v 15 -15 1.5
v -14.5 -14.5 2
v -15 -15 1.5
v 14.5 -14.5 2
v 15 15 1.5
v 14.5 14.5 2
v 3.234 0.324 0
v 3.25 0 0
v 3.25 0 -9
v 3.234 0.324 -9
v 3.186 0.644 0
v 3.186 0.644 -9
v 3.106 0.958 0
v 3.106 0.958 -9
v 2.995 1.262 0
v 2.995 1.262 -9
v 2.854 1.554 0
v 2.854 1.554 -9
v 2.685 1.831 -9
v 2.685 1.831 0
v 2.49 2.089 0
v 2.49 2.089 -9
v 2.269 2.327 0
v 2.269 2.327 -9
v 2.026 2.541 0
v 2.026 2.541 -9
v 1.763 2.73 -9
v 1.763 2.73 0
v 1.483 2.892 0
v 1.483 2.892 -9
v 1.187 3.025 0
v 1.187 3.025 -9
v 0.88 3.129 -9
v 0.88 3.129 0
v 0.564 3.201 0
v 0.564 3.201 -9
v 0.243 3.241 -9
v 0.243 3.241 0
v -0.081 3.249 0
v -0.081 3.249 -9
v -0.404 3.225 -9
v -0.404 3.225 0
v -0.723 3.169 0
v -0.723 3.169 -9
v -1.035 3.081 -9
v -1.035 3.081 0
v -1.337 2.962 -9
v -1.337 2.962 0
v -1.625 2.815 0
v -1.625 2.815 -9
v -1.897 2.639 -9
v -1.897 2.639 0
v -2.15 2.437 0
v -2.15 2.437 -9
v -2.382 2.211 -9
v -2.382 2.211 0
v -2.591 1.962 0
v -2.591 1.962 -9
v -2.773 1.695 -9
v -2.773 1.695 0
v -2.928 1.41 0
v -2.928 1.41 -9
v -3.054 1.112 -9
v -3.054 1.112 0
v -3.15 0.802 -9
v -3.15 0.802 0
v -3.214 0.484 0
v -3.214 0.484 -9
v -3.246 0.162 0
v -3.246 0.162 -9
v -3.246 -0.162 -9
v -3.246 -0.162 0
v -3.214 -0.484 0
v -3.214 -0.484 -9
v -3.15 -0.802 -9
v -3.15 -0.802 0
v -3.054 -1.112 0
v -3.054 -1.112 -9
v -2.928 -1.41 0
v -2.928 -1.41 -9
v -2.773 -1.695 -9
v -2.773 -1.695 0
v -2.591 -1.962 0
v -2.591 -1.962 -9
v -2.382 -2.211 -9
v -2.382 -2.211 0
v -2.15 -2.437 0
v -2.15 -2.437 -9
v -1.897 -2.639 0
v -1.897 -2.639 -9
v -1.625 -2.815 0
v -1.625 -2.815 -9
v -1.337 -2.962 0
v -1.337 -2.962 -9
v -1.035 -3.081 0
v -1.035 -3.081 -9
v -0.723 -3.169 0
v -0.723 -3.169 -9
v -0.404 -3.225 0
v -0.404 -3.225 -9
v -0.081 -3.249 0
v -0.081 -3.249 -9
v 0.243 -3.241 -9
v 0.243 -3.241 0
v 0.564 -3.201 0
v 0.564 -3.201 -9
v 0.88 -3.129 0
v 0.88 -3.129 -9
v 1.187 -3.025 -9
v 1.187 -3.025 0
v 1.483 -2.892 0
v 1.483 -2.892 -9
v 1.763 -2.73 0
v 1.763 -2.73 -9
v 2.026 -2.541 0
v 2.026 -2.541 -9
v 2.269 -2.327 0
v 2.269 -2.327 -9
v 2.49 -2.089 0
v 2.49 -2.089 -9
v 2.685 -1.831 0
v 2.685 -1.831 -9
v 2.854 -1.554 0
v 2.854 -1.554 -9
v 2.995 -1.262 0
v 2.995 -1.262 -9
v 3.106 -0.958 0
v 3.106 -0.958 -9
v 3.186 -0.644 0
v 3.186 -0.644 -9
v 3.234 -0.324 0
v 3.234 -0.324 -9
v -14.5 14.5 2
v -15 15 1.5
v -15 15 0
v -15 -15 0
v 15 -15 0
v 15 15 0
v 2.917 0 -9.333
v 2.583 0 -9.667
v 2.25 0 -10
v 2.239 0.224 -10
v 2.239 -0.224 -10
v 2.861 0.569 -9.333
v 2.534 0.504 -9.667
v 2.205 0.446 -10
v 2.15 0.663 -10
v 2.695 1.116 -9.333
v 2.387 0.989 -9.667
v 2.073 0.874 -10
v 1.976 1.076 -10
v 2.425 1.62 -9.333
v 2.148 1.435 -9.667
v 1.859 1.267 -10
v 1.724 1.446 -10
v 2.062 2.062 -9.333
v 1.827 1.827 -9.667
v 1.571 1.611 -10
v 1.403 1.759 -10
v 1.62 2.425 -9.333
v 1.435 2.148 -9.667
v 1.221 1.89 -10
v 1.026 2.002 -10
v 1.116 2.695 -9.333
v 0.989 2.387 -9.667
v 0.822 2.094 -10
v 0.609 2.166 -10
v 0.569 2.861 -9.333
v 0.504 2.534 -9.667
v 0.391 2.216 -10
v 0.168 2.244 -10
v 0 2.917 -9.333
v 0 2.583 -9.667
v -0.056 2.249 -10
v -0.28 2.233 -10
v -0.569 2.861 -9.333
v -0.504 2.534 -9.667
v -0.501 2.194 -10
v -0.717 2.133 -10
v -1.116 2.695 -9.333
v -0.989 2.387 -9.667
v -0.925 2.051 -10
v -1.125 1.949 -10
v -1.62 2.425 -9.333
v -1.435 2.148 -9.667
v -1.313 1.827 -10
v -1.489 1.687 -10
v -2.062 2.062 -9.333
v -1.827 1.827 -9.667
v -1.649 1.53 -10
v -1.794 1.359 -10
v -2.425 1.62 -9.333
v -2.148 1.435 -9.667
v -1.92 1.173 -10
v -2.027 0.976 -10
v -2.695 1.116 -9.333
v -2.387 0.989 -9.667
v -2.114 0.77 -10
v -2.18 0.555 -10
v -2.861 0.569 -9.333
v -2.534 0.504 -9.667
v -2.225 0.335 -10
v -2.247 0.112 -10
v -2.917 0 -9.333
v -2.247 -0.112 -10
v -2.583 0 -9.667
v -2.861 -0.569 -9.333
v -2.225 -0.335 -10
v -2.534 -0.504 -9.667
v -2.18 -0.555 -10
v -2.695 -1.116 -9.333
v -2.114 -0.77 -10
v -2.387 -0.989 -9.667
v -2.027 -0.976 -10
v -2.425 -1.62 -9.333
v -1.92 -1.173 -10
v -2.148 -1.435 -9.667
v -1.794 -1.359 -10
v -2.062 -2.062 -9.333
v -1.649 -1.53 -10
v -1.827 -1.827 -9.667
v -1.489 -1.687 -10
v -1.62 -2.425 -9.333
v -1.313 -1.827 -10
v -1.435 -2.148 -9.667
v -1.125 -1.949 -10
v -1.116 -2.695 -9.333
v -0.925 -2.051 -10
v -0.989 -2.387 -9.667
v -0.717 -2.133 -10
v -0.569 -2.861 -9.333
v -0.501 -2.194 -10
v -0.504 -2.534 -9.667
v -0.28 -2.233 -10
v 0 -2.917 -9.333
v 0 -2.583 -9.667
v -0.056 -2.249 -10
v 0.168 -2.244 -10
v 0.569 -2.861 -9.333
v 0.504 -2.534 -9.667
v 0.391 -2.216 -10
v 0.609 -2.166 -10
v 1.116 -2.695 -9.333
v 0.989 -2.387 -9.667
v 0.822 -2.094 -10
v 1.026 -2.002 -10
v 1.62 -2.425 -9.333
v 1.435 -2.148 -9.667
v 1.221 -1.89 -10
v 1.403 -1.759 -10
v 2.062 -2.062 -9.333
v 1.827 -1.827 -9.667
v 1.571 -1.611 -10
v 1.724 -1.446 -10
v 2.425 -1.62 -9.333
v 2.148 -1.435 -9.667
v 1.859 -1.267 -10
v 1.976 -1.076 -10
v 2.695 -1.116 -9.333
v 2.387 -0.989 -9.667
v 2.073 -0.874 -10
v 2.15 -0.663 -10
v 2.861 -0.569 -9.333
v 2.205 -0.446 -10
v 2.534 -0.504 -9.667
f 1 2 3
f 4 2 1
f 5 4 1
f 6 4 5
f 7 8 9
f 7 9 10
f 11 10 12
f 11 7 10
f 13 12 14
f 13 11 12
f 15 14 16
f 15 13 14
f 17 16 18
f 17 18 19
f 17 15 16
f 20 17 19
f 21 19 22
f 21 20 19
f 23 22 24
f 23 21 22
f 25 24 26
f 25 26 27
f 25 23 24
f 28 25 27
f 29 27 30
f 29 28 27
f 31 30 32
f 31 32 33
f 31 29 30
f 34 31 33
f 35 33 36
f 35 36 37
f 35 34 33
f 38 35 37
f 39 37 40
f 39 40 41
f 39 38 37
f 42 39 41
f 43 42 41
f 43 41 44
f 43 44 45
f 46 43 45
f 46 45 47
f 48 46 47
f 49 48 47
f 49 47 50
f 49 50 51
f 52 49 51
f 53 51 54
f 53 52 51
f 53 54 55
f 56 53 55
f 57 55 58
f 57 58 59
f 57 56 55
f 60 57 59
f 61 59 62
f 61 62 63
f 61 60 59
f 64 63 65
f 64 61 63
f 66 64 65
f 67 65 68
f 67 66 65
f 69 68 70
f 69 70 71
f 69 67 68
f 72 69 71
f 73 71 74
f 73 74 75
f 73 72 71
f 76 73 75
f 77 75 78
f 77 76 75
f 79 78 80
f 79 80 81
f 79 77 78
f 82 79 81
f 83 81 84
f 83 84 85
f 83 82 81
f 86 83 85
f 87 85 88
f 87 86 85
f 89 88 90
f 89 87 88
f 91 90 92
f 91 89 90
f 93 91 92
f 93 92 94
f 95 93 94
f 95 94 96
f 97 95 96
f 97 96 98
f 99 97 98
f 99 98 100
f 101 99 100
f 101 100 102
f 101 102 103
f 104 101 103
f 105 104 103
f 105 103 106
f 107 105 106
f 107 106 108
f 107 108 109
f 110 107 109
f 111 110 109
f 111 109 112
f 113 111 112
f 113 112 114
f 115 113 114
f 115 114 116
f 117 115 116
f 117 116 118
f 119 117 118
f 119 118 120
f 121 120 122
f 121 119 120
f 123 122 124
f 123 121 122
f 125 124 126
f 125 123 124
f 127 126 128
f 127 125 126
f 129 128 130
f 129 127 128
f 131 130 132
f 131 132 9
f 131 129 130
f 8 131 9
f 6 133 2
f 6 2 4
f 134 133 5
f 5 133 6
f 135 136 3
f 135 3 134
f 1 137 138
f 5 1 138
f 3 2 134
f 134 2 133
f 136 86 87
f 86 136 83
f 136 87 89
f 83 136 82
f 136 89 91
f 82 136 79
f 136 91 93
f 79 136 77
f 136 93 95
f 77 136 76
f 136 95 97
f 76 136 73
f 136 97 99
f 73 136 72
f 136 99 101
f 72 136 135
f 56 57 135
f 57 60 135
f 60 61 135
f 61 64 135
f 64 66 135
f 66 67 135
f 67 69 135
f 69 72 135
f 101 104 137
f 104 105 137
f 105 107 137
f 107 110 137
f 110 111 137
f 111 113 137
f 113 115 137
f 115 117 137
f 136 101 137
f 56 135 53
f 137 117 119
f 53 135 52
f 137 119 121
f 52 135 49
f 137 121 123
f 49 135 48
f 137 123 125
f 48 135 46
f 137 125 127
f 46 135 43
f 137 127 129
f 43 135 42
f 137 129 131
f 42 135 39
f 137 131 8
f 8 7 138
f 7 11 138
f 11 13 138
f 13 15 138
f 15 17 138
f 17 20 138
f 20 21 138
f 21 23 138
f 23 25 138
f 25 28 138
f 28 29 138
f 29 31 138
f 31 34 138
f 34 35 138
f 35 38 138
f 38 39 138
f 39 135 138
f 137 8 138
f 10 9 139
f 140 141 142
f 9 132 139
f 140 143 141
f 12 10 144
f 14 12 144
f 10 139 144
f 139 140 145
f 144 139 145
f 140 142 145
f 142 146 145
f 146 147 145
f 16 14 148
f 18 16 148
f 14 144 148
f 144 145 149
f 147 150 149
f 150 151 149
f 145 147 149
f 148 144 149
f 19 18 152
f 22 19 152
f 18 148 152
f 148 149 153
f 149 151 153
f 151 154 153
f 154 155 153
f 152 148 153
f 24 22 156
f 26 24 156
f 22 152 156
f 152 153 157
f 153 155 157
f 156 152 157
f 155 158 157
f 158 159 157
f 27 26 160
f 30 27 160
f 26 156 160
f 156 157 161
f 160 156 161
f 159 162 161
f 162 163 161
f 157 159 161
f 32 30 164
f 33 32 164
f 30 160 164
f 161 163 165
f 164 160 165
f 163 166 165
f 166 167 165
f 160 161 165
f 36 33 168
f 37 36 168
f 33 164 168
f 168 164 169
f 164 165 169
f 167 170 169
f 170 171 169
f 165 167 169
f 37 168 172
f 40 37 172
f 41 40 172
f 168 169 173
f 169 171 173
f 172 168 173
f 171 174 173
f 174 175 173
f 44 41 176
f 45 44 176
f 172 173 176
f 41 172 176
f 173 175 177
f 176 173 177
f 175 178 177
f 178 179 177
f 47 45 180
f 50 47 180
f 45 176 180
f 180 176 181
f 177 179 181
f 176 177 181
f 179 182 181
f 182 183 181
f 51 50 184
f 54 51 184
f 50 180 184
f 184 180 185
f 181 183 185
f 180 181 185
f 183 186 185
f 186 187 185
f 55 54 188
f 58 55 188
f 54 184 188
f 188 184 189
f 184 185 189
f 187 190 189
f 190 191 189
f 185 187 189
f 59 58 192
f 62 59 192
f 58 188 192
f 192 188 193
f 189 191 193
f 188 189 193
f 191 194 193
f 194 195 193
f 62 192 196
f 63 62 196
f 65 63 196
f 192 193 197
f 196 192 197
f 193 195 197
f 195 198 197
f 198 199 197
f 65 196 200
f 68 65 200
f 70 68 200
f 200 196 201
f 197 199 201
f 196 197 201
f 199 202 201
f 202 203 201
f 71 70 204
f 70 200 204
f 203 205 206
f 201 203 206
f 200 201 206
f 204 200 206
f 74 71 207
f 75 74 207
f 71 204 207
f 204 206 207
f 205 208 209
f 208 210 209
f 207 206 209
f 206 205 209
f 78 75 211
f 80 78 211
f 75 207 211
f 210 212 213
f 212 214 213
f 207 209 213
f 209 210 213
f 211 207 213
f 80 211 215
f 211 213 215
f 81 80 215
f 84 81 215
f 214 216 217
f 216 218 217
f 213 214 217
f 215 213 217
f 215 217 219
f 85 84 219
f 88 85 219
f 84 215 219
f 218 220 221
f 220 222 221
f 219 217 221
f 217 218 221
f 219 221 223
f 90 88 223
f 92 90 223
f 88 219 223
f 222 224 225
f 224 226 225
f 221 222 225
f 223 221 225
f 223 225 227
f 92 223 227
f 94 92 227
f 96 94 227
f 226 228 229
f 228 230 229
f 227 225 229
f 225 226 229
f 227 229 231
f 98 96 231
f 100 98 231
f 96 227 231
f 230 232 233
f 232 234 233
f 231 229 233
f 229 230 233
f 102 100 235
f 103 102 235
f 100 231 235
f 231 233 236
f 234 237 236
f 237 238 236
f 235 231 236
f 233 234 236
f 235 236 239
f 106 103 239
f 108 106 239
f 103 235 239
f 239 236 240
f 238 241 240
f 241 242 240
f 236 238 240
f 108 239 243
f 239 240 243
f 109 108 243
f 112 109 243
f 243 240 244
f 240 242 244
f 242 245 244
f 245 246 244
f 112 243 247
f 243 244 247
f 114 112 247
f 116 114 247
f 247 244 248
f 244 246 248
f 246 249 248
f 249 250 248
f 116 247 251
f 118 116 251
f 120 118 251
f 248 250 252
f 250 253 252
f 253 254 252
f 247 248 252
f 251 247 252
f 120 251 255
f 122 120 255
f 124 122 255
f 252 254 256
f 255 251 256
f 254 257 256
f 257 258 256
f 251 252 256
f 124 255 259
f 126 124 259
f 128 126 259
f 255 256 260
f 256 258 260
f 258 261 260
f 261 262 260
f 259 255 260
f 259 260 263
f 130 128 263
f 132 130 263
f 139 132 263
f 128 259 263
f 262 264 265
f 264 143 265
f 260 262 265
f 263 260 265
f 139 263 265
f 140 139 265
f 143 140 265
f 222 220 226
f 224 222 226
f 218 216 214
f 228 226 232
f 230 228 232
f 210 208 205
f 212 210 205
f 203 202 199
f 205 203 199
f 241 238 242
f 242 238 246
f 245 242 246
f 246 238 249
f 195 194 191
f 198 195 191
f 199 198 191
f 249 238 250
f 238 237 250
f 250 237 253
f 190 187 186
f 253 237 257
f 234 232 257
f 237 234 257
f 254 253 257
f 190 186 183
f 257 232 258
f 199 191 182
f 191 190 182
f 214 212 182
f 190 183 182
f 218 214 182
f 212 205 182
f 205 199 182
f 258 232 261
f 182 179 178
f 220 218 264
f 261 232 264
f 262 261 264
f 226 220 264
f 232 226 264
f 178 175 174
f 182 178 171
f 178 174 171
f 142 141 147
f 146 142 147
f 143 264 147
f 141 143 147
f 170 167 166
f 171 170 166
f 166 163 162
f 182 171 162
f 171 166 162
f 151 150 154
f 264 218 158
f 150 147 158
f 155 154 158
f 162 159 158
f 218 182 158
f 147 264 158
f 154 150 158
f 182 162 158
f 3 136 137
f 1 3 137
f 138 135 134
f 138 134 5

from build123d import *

# Parameters (mm, degrees)
F0_W     = 30
F0_H     = 30
F1_DEPTH = 2
F2_SIZE  = 0.5
F3_R     = 3.25
F4_DEPTH = 10
F5_SIZE  = 1


with BuildPart() as f1:
    # F0 (on Top) → F1 (new body)
    with BuildSketch(Plane.XY):
        Rectangle(F0_W, F0_H)
    extrude(amount=F1_DEPTH)

    # F2
    f2_edges = [f1.edges().sort_by_distance(p)[0] for p in [
        (-15, 0, 2),
        (0, 15, 2),
        (15, 0, 2),
        (0, -15, 2),
    ]]
    chamfer(f2_edges, length=F2_SIZE)

    # F3 (on Top) → F4 (join)
    with BuildSketch(Plane.XY):
        Circle(F3_R)
    extrude(amount=-F4_DEPTH)

    # F5
    f5_edges = [f1.edges().sort_by_distance(p)[0] for p in [
        (-3.25, 0, -10),
    ]]
    chamfer(f5_edges, length=F5_SIZE)


solid = f1.part
